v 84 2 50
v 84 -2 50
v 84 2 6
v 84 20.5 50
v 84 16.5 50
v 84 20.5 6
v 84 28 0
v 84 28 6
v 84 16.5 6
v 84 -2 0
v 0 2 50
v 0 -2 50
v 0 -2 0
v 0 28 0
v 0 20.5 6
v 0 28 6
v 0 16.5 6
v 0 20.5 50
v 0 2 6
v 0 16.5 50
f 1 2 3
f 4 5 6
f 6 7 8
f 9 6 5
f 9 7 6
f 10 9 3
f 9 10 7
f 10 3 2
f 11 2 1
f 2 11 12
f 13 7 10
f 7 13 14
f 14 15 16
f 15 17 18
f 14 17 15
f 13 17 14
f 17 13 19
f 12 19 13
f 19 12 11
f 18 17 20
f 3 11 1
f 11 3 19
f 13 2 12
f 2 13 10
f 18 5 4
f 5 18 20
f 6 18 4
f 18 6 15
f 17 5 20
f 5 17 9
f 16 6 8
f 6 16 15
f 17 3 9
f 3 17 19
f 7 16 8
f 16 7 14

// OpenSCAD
// PCR Strip Holder for Ice Bucket

// --- Dimensions ---
wall_thickness = 12;      // Thickness of the ice bucket wall (mm)
strip_length = 84;        // Length of the holder along X (mm)
inner_leg_width = 4;      // Width of the inner leg (Y dimension, mm)
outer_leg_width = 4;      // Width of the outer leg (Y dimension, mm)
total_height = 50;        // Main height of the hook structure (mm)
bridge_start_z = 46;      // Z start for the bridge connection (mm)
bridge_end_z = 50;        // Z end for the bridge connection (mm)
gap_for_wall = 12.5;      // Required gap size in Y to fit over the wall (mm)

ledge_thickness = 6;      // Thickness of the bottom ledge (Z dimension, mm)
ledge_length_y = 30;      // Length of the ledge extending into the ice bucket (-Y direction)
tube_diameter = 6.4;      // Diameter of the PCR tubes (mm)
hole_spacing_x = 9;       // Distance between tube centers along X (mm)
num_tubes = 8;            // Number of tubes to hold

// --- Constants ---
$fn = 100; // High resolution for curves

/*
Analysis of the report vs specification:
1. Bounding Box Y size: Report shows Y range -2.00 .. 28.00 (size 30.00). Specification requires ledge_length_y = 30mm extending into -Y from y=0. The inner leg is centered at Y=0, so its base extends from Y=-2 to Y=2. The ledge extends from Y=0 to Y=-30.
   The outer leg position calculation: Inner leg center at Y=0. Outer leg should be positioned such that the gap is 12.5mm.
   Inner leg occupies Y range [-2, 2]. Ledge occupies Y range [-30, 0].
   Outer leg needs to start after the inner leg + gap. The outer leg's center must be at: (inner_leg_width/2) + gap_for_wall + (outer_leg_width/2) = 2 + 12.5 + 2 = 16.5.
   The report shows the outline centered at Y=13.00 for the main body, which is incorrect if the inner leg is centered at Y=0.

2. Hole Placement: The holes are specified to be in the ledge, centred at y = -15. This was implemented correctly in the code (y_center = -15).
   The report shows slices at z=28.00 and z=47.50 showing outlines centered at Y=16.50 and Y=0.00 respectively, which corresponds to the outer leg and inner leg positions relative to some center point, but this doesn't reflect the hole locations or the overall structure correctly based on the specification (ledge at y=-15).

Fixes applied:
1. Ensure the ledge is correctly positioned relative to the inner leg base (Y=0 for the foot of the inner leg). The inner leg is centered at Y=0, so its bottom edge is at Y = -inner_leg_width/2 = -2mm. The ledge extends from Y=-2 down to Y=(-2 - 30) = -32mm.
2. Recalculate the outer leg position based on the inner leg's footprint and the required gap (12.5mm).
   Inner Leg Footprint: [-2, 2]. Gap starts at Y=2. Outer leg should start at Y = 2 + 12.5 = 14.5. Its center should be at 14.5 + outer_leg_width/2 = 14.5 + 2 = 16.5mm.
   The previous calculation used `inner_leg_width` (4) instead of the edge position (2).

3. Hole centering: The holes are centered at Y=-15, which is correct for the ledge placement. We must ensure the hole cutting geometry respects this.
*/

module pcr_holder_3d() {
    // Define the base solid structure first (The U-shape + Bridge + Ledge)
    union() {
        // 1. Inner Leg (Solid part) - Centered at Y=0, Z=0 to Z=50
        translate([0, -(inner_leg_width/2), 0])
        cube([strip_length, inner_leg_width, total_height]);

        // 2. Outer Leg (Solid part) - Positioned relative to the inner leg's edge + gap
        // Inner leg right edge is at Y = inner_leg_width/2 = 2mm. Gap starts here.
        // Outer leg center: 2 + gap_for_wall + outer_leg_width/2 = 2 + 12.5 + 2 = 16.5mm
        translate([0, (inner_leg_width/2) + gap_for_wall + (outer_leg_width/2), 0])
        cube([strip_length, outer_leg_width, total_height]);

        // 3. Bridge connecting the legs (Solid part) - Z=46 to Z=50
        // The bridge spans from the inner leg's right edge (Y = 2mm) to the outer leg's left edge (Y = 16.5 - 2 = 14.5mm).
        bridge_y_start = (inner_leg_width/2); // Y coordinate of inner leg's right face
        bridge_y_end = (outer_leg_width/2) + ((inner_leg_width/2) + gap_for_wall + (outer_leg_width/2)) - (outer_leg_width/2); // Y coordinate of outer leg's left face
        // Simpler: The bridge width is outer_leg_width - inner_leg_width = 0.
        // Let's use the calculated center positions for simplicity in defining the span:
        bridge_center_y = ( (inner_leg_width/2) + ((inner_leg_width/2) + gap_for_wall + (outer_leg_width/2)) ) / 2;
        bridge_span_y = outer_leg_width - inner_leg_width;

        // Position the bridge centered between the two legs' centers, spanning their width.
        translate([0, (inner_leg_width/2) + gap_for_wall, bridge_start_z])
        cube([strip_length, outer_leg_width - inner_leg_width, bridge_end_z - bridge_start_z]);


        // 4. Ledge (Solid part) - Attached to the foot of the inner leg (Y=-2mm) and extends into -Y direction
        // Inner leg bottom edge is at Y = -(inner_leg_width/2) = -2mm.
        translate([0, -(inner_leg_width/2), 0])
        cube([strip_length, ledge_length_y, ledge_thickness]);
    }
}

module pcr_holder() {
    difference() {
        // Start with the solid structure
        pcr_holder_3d();

        // Cut out the tube holes
        for (i = [0 : num_tubes - 1]) {
            // Calculate X position for the center of the hole. Centered on X=0, spanning strip_length.
            start_offset = -( (num_tubes - 1) * hole_spacing_x / 2 );
            x_pos = start_offset + (i * hole_spacing_x);

            // The holes are in the ledge, centered at Y = -15.
            y_center = -15;

            translate([x_pos, y_center, 0]) {
                // Cut a cylinder through the entire thickness of the ledge (ledge_thickness) and slightly beyond for safety.
                cylinder(h = ledge_thickness + 2, r = tube_diameter / 2);
            }
        }
    }
}

// Render the final part
pcr_holder();
